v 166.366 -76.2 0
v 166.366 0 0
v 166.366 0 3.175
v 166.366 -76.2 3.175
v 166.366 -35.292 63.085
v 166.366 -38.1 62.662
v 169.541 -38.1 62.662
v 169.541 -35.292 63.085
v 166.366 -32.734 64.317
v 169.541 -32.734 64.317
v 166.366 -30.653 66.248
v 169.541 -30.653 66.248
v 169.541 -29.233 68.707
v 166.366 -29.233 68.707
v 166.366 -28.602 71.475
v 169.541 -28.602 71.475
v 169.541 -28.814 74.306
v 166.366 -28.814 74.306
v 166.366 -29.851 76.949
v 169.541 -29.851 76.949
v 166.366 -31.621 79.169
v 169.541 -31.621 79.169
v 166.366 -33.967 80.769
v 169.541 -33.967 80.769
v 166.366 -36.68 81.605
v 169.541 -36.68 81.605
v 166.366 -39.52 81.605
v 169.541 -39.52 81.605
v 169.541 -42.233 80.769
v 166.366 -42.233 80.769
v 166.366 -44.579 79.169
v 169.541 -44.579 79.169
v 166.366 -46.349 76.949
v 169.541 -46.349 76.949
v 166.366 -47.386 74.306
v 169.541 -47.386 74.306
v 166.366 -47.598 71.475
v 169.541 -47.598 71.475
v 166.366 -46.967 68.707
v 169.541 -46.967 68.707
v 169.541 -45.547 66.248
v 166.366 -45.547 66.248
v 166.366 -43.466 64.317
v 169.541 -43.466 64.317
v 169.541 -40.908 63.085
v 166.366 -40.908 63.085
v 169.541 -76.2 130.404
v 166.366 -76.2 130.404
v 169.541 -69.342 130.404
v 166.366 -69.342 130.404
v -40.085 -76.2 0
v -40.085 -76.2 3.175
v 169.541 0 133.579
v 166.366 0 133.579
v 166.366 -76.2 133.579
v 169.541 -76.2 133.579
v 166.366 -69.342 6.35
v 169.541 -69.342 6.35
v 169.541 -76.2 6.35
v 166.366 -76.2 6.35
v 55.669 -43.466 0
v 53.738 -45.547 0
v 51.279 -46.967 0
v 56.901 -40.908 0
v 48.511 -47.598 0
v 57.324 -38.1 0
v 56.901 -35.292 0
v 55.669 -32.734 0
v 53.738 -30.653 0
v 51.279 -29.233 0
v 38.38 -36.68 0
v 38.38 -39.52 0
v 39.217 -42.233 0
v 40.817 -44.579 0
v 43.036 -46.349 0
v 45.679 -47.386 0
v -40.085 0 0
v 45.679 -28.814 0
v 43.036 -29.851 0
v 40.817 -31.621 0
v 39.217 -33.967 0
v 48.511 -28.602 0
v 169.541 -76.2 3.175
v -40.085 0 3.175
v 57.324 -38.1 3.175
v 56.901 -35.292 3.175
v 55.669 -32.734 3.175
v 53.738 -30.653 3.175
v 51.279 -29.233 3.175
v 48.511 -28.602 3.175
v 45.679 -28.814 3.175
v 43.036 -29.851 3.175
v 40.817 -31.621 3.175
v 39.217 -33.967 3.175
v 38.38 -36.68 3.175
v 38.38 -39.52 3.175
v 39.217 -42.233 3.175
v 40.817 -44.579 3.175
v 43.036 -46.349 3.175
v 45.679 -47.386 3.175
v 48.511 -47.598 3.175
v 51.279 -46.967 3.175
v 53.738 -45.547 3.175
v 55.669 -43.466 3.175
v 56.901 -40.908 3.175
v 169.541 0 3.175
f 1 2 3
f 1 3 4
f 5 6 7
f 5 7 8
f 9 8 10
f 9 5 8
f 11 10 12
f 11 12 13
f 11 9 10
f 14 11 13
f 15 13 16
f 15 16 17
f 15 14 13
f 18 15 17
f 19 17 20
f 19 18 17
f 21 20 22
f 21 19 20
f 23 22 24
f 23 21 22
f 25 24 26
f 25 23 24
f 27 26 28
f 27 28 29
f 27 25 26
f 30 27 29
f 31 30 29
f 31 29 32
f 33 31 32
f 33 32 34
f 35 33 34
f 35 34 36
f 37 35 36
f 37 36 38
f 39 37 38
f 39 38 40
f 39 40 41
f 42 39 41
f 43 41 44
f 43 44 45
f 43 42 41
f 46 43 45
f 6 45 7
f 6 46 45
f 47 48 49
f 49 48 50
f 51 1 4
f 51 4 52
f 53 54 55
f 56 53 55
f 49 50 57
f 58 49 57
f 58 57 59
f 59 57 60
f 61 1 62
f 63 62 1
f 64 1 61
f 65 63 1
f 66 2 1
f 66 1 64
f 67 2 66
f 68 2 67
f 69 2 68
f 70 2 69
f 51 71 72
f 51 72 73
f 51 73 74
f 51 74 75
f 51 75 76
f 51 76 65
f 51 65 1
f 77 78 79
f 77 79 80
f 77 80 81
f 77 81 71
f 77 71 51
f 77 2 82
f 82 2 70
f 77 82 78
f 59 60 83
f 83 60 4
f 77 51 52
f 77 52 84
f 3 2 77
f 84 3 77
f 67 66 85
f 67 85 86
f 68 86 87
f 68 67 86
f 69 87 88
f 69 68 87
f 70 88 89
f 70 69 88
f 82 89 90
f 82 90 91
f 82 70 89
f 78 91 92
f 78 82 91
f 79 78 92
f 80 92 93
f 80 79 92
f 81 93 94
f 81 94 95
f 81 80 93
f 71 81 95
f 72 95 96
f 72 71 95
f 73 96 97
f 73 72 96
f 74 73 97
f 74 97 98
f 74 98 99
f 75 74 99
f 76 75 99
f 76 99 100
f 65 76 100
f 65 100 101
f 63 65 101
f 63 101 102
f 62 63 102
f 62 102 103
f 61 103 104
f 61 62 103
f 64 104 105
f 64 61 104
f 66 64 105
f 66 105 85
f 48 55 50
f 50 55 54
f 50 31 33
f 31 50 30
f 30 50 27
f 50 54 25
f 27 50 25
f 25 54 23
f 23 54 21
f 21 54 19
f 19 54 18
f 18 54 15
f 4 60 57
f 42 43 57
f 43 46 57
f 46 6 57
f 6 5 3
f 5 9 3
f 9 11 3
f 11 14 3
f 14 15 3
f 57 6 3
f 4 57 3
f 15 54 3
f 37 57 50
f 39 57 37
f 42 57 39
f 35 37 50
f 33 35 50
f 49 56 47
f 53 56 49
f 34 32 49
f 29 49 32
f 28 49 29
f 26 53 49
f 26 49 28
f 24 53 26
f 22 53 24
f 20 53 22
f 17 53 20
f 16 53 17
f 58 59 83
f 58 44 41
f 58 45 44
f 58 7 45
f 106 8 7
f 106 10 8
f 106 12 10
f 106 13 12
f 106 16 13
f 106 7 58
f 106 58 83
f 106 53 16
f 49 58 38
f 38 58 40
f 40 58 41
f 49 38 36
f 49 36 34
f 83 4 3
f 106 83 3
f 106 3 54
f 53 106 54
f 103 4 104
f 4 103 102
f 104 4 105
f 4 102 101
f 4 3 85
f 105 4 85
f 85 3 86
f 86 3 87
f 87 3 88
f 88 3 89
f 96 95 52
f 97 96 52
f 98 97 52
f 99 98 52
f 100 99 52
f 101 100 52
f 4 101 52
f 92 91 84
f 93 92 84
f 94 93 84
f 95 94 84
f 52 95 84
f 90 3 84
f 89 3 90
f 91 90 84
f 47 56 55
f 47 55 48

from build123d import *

# Parameters (mm, degrees)
SKETCH2_R           = 9.525
BOSS_EXTRUDE3_DEPTH = 3.175
SKETCH9_R           = 9.525
BOSS_EXTRUDE5_DEPTH = 3.175


with BuildPart() as part:
    # Sketch2 → Boss-Extrude3 (new body)
    with BuildSketch(Plane.XY):
        Polygon((-33.735047644, 0), (160.016152356, 0), (166.366152356, 0), (166.366152356, -76.2), (-40.085047644, -76.2), (-40.085047644, 0), align=None)
        with Locations((47.798952356, -38.1)):
            Circle(SKETCH2_R, mode=Mode.SUBTRACT)
    extrude(amount=BOSS_EXTRUDE3_DEPTH)


with BuildPart() as body_2:
    # Sketch9 → Boss-Extrude5 (new body)
    with BuildSketch(Plane(origin=(166.366152356, 0, 0), x_dir=(0, 0, -1), z_dir=(1, 0, 0))):
        Polygon((-3.175, 0), (-133.5786, 0), (-133.5786, -76.2), (-130.4036, -76.2), (-130.4036, -69.342), (-6.35, -69.342), (-6.35, -76.2), (-3.175, -76.2), align=None)
        with Locations((-72.1868, -38.1)):
            Circle(SKETCH9_R, mode=Mode.SUBTRACT)
    extrude(amount=BOSS_EXTRUDE5_DEPTH)


solid = Compound([part.part, body_2.part])
